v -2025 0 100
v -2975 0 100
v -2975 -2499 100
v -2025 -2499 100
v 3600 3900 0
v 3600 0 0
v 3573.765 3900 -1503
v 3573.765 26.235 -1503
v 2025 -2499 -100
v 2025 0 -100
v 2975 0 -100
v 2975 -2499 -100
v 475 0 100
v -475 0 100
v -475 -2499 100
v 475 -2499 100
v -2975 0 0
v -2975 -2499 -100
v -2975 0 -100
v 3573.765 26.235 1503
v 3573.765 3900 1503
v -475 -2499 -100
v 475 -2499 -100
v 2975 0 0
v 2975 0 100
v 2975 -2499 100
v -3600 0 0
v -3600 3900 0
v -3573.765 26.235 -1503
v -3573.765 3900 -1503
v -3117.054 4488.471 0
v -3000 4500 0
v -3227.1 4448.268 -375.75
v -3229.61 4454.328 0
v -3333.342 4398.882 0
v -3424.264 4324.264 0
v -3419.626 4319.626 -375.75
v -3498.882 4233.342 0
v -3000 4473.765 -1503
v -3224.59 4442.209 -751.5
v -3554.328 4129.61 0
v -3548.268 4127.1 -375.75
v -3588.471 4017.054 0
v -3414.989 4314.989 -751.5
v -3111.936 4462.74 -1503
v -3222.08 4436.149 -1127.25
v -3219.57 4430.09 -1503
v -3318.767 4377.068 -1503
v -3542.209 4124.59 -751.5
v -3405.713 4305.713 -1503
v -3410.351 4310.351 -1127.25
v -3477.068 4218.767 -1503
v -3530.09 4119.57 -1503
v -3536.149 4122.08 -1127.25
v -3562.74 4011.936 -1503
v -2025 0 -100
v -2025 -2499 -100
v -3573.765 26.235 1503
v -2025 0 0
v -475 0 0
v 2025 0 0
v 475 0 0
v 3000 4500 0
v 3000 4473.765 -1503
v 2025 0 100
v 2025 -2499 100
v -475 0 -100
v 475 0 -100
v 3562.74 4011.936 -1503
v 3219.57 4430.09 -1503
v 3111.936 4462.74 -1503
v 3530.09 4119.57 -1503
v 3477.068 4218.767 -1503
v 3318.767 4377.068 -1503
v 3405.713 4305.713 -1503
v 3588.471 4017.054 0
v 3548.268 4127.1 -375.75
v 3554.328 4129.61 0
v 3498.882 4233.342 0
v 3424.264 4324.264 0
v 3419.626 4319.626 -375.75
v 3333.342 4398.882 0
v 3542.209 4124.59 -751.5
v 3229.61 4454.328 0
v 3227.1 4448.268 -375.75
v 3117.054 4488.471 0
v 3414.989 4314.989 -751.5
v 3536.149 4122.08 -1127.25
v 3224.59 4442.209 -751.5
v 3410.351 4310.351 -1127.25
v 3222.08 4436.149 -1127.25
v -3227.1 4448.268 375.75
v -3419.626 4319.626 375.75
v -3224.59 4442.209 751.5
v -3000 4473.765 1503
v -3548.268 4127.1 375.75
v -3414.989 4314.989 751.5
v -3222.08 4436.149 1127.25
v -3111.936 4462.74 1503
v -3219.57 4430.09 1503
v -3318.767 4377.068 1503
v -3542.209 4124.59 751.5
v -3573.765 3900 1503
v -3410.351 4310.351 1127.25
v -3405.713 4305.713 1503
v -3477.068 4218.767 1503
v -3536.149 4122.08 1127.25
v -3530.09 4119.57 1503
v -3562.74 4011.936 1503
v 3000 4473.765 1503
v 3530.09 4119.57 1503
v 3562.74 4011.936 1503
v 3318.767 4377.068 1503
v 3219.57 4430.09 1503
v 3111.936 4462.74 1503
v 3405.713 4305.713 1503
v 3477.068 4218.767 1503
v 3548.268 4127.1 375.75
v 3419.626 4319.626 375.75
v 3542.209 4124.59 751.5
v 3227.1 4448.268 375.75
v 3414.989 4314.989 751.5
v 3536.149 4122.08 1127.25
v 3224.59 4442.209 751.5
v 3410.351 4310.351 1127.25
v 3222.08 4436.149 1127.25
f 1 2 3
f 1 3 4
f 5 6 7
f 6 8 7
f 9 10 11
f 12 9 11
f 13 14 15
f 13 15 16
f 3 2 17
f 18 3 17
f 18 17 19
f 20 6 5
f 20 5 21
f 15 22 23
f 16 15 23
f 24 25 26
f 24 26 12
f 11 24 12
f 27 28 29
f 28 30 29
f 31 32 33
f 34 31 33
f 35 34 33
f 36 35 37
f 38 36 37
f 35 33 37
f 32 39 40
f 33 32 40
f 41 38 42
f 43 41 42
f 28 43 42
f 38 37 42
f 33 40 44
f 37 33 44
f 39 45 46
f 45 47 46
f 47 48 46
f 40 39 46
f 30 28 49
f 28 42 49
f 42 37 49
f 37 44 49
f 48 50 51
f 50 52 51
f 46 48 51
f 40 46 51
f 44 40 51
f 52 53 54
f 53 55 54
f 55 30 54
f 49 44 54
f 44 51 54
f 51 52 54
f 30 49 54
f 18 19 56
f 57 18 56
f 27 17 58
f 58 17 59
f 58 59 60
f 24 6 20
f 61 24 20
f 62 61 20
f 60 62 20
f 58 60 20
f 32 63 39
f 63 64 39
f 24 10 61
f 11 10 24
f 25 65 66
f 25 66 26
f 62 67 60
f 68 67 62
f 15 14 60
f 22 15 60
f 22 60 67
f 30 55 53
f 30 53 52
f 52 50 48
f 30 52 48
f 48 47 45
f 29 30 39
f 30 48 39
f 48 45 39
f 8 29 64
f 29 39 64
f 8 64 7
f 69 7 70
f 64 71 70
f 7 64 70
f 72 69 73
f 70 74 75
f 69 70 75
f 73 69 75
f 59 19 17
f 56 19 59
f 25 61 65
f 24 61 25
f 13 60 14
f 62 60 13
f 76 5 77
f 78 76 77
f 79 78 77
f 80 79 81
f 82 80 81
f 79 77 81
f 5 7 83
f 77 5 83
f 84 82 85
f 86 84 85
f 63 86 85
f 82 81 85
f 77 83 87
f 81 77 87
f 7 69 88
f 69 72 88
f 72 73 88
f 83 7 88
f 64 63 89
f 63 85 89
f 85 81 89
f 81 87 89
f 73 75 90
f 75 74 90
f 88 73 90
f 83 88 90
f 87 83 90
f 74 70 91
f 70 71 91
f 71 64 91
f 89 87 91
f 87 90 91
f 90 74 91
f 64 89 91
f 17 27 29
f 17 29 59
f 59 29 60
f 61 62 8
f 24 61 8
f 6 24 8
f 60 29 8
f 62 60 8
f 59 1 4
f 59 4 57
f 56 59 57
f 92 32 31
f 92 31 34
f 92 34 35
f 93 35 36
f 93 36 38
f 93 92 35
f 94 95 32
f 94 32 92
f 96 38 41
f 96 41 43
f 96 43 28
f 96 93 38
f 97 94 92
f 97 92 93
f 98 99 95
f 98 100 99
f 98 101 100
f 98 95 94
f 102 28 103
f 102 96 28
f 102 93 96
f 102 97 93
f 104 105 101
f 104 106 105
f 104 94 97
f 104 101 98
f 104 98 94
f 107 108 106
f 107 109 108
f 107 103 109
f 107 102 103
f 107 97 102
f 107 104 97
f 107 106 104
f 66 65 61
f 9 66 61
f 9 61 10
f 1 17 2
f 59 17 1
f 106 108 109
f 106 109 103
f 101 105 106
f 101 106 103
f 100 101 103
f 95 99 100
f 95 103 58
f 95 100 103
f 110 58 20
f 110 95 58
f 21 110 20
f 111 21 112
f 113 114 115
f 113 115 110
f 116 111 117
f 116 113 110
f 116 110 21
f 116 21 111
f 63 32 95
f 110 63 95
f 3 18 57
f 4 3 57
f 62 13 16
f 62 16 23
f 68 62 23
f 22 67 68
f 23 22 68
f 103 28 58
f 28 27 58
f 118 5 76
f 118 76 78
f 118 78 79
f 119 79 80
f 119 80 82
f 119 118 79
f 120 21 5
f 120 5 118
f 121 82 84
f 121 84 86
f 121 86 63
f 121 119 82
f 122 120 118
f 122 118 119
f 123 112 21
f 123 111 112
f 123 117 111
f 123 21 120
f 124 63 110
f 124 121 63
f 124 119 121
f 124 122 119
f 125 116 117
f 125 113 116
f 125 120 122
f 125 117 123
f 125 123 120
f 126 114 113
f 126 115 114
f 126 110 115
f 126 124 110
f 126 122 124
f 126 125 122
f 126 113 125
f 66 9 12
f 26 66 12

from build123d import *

# Parameters (mm, degrees)
SKETCH3_W                     = 950
SKETCH3_H                     = 200
BOSS_EXTRUDE1_DEPTH           = 2499
BOSS_EXTRUDE1_2_DEPTH         = 2499
BOSS_EXTRUDE1_3_DEPTH         = 2499
BOSS_EXTRUDE3_DEPTH           = 1503
BOSS_EXTRUDE3_TAPER           = 1
BOSS_EXTRUDE3_OTHER_WAY_DEPTH = 1503
BOSS_EXTRUDE3_OTHER_WAY_TAPER = 1


with BuildPart() as part:
    # Sketch3 → Boss-Extrude1 (new body)
    with BuildSketch(Plane(origin=(0, 0, 0), x_dir=(1, 0, 0), z_dir=(0, 1, 0))):
        with Locations((-2500, 0)):
            Rectangle(SKETCH3_W, SKETCH3_H)
    extrude(amount=-BOSS_EXTRUDE1_DEPTH)



with BuildPart() as body_2:
    # Sketch3 → Boss-Extrude1 2 (new body)
    with BuildSketch(Plane(origin=(0, 0, 0), x_dir=(1, 0, 0), z_dir=(0, 1, 0))):
        with Locations((2500, 0)):
            Rectangle(SKETCH3_W, SKETCH3_H)
    extrude(amount=-BOSS_EXTRUDE1_2_DEPTH)


with BuildPart() as body_3:
    # Sketch3 → Boss-Extrude1 3 (new body)
    with BuildSketch(Plane(origin=(0, 0, 0), x_dir=(1, 0, 0), z_dir=(0, 1, 0))):
        Rectangle(SKETCH3_W, SKETCH3_H)
    extrude(amount=-BOSS_EXTRUDE1_3_DEPTH)


with BuildPart() as body_4:
    # Sketch1 → Boss-Extrude3 (new body)
    with BuildSketch(Plane.XY):
        with BuildLine():
            Line((3600, 0), (3600, 3900))
            ThreePointArc((3600, 3900), (3424.264068712, 4324.264068712), (3000, 4500))
            Line((3000, 4500), (-3000, 4500))
            ThreePointArc((-3000, 4500), (-3424.264068712, 4324.264068712), (-3600, 3900))
            Line((-3600, 3900), (-3600, 0))
            Line((-3600, 0), (3600, 0))
        make_face()
    extrude(amount=BOSS_EXTRUDE3_DEPTH, taper=BOSS_EXTRUDE3_TAPER)


with BuildPart() as part_1:
    add(part.part)

    add(body_2.part)  # Boss-Extrude3 other way merges body 2

    add(body_3.part)  # Boss-Extrude3 other way merges body 3

    add(body_4.part)  # Boss-Extrude3 other way merges body 4
    # Sketch1 → Boss-Extrude3 other way (add)
    with BuildSketch(Plane.XY):
        with BuildLine():
            Line((3600, 0), (3600, 3900))
            ThreePointArc((3600, 3900), (3424.264068712, 4324.264068712), (3000, 4500))
            Line((3000, 4500), (-3000, 4500))
            ThreePointArc((-3000, 4500), (-3424.264068712, 4324.264068712), (-3600, 3900))
            Line((-3600, 3900), (-3600, 0))
            Line((-3600, 0), (3600, 0))
        make_face()
    extrude(amount=-BOSS_EXTRUDE3_OTHER_WAY_DEPTH, taper=BOSS_EXTRUDE3_OTHER_WAY_TAPER)


solid = part_1.part
